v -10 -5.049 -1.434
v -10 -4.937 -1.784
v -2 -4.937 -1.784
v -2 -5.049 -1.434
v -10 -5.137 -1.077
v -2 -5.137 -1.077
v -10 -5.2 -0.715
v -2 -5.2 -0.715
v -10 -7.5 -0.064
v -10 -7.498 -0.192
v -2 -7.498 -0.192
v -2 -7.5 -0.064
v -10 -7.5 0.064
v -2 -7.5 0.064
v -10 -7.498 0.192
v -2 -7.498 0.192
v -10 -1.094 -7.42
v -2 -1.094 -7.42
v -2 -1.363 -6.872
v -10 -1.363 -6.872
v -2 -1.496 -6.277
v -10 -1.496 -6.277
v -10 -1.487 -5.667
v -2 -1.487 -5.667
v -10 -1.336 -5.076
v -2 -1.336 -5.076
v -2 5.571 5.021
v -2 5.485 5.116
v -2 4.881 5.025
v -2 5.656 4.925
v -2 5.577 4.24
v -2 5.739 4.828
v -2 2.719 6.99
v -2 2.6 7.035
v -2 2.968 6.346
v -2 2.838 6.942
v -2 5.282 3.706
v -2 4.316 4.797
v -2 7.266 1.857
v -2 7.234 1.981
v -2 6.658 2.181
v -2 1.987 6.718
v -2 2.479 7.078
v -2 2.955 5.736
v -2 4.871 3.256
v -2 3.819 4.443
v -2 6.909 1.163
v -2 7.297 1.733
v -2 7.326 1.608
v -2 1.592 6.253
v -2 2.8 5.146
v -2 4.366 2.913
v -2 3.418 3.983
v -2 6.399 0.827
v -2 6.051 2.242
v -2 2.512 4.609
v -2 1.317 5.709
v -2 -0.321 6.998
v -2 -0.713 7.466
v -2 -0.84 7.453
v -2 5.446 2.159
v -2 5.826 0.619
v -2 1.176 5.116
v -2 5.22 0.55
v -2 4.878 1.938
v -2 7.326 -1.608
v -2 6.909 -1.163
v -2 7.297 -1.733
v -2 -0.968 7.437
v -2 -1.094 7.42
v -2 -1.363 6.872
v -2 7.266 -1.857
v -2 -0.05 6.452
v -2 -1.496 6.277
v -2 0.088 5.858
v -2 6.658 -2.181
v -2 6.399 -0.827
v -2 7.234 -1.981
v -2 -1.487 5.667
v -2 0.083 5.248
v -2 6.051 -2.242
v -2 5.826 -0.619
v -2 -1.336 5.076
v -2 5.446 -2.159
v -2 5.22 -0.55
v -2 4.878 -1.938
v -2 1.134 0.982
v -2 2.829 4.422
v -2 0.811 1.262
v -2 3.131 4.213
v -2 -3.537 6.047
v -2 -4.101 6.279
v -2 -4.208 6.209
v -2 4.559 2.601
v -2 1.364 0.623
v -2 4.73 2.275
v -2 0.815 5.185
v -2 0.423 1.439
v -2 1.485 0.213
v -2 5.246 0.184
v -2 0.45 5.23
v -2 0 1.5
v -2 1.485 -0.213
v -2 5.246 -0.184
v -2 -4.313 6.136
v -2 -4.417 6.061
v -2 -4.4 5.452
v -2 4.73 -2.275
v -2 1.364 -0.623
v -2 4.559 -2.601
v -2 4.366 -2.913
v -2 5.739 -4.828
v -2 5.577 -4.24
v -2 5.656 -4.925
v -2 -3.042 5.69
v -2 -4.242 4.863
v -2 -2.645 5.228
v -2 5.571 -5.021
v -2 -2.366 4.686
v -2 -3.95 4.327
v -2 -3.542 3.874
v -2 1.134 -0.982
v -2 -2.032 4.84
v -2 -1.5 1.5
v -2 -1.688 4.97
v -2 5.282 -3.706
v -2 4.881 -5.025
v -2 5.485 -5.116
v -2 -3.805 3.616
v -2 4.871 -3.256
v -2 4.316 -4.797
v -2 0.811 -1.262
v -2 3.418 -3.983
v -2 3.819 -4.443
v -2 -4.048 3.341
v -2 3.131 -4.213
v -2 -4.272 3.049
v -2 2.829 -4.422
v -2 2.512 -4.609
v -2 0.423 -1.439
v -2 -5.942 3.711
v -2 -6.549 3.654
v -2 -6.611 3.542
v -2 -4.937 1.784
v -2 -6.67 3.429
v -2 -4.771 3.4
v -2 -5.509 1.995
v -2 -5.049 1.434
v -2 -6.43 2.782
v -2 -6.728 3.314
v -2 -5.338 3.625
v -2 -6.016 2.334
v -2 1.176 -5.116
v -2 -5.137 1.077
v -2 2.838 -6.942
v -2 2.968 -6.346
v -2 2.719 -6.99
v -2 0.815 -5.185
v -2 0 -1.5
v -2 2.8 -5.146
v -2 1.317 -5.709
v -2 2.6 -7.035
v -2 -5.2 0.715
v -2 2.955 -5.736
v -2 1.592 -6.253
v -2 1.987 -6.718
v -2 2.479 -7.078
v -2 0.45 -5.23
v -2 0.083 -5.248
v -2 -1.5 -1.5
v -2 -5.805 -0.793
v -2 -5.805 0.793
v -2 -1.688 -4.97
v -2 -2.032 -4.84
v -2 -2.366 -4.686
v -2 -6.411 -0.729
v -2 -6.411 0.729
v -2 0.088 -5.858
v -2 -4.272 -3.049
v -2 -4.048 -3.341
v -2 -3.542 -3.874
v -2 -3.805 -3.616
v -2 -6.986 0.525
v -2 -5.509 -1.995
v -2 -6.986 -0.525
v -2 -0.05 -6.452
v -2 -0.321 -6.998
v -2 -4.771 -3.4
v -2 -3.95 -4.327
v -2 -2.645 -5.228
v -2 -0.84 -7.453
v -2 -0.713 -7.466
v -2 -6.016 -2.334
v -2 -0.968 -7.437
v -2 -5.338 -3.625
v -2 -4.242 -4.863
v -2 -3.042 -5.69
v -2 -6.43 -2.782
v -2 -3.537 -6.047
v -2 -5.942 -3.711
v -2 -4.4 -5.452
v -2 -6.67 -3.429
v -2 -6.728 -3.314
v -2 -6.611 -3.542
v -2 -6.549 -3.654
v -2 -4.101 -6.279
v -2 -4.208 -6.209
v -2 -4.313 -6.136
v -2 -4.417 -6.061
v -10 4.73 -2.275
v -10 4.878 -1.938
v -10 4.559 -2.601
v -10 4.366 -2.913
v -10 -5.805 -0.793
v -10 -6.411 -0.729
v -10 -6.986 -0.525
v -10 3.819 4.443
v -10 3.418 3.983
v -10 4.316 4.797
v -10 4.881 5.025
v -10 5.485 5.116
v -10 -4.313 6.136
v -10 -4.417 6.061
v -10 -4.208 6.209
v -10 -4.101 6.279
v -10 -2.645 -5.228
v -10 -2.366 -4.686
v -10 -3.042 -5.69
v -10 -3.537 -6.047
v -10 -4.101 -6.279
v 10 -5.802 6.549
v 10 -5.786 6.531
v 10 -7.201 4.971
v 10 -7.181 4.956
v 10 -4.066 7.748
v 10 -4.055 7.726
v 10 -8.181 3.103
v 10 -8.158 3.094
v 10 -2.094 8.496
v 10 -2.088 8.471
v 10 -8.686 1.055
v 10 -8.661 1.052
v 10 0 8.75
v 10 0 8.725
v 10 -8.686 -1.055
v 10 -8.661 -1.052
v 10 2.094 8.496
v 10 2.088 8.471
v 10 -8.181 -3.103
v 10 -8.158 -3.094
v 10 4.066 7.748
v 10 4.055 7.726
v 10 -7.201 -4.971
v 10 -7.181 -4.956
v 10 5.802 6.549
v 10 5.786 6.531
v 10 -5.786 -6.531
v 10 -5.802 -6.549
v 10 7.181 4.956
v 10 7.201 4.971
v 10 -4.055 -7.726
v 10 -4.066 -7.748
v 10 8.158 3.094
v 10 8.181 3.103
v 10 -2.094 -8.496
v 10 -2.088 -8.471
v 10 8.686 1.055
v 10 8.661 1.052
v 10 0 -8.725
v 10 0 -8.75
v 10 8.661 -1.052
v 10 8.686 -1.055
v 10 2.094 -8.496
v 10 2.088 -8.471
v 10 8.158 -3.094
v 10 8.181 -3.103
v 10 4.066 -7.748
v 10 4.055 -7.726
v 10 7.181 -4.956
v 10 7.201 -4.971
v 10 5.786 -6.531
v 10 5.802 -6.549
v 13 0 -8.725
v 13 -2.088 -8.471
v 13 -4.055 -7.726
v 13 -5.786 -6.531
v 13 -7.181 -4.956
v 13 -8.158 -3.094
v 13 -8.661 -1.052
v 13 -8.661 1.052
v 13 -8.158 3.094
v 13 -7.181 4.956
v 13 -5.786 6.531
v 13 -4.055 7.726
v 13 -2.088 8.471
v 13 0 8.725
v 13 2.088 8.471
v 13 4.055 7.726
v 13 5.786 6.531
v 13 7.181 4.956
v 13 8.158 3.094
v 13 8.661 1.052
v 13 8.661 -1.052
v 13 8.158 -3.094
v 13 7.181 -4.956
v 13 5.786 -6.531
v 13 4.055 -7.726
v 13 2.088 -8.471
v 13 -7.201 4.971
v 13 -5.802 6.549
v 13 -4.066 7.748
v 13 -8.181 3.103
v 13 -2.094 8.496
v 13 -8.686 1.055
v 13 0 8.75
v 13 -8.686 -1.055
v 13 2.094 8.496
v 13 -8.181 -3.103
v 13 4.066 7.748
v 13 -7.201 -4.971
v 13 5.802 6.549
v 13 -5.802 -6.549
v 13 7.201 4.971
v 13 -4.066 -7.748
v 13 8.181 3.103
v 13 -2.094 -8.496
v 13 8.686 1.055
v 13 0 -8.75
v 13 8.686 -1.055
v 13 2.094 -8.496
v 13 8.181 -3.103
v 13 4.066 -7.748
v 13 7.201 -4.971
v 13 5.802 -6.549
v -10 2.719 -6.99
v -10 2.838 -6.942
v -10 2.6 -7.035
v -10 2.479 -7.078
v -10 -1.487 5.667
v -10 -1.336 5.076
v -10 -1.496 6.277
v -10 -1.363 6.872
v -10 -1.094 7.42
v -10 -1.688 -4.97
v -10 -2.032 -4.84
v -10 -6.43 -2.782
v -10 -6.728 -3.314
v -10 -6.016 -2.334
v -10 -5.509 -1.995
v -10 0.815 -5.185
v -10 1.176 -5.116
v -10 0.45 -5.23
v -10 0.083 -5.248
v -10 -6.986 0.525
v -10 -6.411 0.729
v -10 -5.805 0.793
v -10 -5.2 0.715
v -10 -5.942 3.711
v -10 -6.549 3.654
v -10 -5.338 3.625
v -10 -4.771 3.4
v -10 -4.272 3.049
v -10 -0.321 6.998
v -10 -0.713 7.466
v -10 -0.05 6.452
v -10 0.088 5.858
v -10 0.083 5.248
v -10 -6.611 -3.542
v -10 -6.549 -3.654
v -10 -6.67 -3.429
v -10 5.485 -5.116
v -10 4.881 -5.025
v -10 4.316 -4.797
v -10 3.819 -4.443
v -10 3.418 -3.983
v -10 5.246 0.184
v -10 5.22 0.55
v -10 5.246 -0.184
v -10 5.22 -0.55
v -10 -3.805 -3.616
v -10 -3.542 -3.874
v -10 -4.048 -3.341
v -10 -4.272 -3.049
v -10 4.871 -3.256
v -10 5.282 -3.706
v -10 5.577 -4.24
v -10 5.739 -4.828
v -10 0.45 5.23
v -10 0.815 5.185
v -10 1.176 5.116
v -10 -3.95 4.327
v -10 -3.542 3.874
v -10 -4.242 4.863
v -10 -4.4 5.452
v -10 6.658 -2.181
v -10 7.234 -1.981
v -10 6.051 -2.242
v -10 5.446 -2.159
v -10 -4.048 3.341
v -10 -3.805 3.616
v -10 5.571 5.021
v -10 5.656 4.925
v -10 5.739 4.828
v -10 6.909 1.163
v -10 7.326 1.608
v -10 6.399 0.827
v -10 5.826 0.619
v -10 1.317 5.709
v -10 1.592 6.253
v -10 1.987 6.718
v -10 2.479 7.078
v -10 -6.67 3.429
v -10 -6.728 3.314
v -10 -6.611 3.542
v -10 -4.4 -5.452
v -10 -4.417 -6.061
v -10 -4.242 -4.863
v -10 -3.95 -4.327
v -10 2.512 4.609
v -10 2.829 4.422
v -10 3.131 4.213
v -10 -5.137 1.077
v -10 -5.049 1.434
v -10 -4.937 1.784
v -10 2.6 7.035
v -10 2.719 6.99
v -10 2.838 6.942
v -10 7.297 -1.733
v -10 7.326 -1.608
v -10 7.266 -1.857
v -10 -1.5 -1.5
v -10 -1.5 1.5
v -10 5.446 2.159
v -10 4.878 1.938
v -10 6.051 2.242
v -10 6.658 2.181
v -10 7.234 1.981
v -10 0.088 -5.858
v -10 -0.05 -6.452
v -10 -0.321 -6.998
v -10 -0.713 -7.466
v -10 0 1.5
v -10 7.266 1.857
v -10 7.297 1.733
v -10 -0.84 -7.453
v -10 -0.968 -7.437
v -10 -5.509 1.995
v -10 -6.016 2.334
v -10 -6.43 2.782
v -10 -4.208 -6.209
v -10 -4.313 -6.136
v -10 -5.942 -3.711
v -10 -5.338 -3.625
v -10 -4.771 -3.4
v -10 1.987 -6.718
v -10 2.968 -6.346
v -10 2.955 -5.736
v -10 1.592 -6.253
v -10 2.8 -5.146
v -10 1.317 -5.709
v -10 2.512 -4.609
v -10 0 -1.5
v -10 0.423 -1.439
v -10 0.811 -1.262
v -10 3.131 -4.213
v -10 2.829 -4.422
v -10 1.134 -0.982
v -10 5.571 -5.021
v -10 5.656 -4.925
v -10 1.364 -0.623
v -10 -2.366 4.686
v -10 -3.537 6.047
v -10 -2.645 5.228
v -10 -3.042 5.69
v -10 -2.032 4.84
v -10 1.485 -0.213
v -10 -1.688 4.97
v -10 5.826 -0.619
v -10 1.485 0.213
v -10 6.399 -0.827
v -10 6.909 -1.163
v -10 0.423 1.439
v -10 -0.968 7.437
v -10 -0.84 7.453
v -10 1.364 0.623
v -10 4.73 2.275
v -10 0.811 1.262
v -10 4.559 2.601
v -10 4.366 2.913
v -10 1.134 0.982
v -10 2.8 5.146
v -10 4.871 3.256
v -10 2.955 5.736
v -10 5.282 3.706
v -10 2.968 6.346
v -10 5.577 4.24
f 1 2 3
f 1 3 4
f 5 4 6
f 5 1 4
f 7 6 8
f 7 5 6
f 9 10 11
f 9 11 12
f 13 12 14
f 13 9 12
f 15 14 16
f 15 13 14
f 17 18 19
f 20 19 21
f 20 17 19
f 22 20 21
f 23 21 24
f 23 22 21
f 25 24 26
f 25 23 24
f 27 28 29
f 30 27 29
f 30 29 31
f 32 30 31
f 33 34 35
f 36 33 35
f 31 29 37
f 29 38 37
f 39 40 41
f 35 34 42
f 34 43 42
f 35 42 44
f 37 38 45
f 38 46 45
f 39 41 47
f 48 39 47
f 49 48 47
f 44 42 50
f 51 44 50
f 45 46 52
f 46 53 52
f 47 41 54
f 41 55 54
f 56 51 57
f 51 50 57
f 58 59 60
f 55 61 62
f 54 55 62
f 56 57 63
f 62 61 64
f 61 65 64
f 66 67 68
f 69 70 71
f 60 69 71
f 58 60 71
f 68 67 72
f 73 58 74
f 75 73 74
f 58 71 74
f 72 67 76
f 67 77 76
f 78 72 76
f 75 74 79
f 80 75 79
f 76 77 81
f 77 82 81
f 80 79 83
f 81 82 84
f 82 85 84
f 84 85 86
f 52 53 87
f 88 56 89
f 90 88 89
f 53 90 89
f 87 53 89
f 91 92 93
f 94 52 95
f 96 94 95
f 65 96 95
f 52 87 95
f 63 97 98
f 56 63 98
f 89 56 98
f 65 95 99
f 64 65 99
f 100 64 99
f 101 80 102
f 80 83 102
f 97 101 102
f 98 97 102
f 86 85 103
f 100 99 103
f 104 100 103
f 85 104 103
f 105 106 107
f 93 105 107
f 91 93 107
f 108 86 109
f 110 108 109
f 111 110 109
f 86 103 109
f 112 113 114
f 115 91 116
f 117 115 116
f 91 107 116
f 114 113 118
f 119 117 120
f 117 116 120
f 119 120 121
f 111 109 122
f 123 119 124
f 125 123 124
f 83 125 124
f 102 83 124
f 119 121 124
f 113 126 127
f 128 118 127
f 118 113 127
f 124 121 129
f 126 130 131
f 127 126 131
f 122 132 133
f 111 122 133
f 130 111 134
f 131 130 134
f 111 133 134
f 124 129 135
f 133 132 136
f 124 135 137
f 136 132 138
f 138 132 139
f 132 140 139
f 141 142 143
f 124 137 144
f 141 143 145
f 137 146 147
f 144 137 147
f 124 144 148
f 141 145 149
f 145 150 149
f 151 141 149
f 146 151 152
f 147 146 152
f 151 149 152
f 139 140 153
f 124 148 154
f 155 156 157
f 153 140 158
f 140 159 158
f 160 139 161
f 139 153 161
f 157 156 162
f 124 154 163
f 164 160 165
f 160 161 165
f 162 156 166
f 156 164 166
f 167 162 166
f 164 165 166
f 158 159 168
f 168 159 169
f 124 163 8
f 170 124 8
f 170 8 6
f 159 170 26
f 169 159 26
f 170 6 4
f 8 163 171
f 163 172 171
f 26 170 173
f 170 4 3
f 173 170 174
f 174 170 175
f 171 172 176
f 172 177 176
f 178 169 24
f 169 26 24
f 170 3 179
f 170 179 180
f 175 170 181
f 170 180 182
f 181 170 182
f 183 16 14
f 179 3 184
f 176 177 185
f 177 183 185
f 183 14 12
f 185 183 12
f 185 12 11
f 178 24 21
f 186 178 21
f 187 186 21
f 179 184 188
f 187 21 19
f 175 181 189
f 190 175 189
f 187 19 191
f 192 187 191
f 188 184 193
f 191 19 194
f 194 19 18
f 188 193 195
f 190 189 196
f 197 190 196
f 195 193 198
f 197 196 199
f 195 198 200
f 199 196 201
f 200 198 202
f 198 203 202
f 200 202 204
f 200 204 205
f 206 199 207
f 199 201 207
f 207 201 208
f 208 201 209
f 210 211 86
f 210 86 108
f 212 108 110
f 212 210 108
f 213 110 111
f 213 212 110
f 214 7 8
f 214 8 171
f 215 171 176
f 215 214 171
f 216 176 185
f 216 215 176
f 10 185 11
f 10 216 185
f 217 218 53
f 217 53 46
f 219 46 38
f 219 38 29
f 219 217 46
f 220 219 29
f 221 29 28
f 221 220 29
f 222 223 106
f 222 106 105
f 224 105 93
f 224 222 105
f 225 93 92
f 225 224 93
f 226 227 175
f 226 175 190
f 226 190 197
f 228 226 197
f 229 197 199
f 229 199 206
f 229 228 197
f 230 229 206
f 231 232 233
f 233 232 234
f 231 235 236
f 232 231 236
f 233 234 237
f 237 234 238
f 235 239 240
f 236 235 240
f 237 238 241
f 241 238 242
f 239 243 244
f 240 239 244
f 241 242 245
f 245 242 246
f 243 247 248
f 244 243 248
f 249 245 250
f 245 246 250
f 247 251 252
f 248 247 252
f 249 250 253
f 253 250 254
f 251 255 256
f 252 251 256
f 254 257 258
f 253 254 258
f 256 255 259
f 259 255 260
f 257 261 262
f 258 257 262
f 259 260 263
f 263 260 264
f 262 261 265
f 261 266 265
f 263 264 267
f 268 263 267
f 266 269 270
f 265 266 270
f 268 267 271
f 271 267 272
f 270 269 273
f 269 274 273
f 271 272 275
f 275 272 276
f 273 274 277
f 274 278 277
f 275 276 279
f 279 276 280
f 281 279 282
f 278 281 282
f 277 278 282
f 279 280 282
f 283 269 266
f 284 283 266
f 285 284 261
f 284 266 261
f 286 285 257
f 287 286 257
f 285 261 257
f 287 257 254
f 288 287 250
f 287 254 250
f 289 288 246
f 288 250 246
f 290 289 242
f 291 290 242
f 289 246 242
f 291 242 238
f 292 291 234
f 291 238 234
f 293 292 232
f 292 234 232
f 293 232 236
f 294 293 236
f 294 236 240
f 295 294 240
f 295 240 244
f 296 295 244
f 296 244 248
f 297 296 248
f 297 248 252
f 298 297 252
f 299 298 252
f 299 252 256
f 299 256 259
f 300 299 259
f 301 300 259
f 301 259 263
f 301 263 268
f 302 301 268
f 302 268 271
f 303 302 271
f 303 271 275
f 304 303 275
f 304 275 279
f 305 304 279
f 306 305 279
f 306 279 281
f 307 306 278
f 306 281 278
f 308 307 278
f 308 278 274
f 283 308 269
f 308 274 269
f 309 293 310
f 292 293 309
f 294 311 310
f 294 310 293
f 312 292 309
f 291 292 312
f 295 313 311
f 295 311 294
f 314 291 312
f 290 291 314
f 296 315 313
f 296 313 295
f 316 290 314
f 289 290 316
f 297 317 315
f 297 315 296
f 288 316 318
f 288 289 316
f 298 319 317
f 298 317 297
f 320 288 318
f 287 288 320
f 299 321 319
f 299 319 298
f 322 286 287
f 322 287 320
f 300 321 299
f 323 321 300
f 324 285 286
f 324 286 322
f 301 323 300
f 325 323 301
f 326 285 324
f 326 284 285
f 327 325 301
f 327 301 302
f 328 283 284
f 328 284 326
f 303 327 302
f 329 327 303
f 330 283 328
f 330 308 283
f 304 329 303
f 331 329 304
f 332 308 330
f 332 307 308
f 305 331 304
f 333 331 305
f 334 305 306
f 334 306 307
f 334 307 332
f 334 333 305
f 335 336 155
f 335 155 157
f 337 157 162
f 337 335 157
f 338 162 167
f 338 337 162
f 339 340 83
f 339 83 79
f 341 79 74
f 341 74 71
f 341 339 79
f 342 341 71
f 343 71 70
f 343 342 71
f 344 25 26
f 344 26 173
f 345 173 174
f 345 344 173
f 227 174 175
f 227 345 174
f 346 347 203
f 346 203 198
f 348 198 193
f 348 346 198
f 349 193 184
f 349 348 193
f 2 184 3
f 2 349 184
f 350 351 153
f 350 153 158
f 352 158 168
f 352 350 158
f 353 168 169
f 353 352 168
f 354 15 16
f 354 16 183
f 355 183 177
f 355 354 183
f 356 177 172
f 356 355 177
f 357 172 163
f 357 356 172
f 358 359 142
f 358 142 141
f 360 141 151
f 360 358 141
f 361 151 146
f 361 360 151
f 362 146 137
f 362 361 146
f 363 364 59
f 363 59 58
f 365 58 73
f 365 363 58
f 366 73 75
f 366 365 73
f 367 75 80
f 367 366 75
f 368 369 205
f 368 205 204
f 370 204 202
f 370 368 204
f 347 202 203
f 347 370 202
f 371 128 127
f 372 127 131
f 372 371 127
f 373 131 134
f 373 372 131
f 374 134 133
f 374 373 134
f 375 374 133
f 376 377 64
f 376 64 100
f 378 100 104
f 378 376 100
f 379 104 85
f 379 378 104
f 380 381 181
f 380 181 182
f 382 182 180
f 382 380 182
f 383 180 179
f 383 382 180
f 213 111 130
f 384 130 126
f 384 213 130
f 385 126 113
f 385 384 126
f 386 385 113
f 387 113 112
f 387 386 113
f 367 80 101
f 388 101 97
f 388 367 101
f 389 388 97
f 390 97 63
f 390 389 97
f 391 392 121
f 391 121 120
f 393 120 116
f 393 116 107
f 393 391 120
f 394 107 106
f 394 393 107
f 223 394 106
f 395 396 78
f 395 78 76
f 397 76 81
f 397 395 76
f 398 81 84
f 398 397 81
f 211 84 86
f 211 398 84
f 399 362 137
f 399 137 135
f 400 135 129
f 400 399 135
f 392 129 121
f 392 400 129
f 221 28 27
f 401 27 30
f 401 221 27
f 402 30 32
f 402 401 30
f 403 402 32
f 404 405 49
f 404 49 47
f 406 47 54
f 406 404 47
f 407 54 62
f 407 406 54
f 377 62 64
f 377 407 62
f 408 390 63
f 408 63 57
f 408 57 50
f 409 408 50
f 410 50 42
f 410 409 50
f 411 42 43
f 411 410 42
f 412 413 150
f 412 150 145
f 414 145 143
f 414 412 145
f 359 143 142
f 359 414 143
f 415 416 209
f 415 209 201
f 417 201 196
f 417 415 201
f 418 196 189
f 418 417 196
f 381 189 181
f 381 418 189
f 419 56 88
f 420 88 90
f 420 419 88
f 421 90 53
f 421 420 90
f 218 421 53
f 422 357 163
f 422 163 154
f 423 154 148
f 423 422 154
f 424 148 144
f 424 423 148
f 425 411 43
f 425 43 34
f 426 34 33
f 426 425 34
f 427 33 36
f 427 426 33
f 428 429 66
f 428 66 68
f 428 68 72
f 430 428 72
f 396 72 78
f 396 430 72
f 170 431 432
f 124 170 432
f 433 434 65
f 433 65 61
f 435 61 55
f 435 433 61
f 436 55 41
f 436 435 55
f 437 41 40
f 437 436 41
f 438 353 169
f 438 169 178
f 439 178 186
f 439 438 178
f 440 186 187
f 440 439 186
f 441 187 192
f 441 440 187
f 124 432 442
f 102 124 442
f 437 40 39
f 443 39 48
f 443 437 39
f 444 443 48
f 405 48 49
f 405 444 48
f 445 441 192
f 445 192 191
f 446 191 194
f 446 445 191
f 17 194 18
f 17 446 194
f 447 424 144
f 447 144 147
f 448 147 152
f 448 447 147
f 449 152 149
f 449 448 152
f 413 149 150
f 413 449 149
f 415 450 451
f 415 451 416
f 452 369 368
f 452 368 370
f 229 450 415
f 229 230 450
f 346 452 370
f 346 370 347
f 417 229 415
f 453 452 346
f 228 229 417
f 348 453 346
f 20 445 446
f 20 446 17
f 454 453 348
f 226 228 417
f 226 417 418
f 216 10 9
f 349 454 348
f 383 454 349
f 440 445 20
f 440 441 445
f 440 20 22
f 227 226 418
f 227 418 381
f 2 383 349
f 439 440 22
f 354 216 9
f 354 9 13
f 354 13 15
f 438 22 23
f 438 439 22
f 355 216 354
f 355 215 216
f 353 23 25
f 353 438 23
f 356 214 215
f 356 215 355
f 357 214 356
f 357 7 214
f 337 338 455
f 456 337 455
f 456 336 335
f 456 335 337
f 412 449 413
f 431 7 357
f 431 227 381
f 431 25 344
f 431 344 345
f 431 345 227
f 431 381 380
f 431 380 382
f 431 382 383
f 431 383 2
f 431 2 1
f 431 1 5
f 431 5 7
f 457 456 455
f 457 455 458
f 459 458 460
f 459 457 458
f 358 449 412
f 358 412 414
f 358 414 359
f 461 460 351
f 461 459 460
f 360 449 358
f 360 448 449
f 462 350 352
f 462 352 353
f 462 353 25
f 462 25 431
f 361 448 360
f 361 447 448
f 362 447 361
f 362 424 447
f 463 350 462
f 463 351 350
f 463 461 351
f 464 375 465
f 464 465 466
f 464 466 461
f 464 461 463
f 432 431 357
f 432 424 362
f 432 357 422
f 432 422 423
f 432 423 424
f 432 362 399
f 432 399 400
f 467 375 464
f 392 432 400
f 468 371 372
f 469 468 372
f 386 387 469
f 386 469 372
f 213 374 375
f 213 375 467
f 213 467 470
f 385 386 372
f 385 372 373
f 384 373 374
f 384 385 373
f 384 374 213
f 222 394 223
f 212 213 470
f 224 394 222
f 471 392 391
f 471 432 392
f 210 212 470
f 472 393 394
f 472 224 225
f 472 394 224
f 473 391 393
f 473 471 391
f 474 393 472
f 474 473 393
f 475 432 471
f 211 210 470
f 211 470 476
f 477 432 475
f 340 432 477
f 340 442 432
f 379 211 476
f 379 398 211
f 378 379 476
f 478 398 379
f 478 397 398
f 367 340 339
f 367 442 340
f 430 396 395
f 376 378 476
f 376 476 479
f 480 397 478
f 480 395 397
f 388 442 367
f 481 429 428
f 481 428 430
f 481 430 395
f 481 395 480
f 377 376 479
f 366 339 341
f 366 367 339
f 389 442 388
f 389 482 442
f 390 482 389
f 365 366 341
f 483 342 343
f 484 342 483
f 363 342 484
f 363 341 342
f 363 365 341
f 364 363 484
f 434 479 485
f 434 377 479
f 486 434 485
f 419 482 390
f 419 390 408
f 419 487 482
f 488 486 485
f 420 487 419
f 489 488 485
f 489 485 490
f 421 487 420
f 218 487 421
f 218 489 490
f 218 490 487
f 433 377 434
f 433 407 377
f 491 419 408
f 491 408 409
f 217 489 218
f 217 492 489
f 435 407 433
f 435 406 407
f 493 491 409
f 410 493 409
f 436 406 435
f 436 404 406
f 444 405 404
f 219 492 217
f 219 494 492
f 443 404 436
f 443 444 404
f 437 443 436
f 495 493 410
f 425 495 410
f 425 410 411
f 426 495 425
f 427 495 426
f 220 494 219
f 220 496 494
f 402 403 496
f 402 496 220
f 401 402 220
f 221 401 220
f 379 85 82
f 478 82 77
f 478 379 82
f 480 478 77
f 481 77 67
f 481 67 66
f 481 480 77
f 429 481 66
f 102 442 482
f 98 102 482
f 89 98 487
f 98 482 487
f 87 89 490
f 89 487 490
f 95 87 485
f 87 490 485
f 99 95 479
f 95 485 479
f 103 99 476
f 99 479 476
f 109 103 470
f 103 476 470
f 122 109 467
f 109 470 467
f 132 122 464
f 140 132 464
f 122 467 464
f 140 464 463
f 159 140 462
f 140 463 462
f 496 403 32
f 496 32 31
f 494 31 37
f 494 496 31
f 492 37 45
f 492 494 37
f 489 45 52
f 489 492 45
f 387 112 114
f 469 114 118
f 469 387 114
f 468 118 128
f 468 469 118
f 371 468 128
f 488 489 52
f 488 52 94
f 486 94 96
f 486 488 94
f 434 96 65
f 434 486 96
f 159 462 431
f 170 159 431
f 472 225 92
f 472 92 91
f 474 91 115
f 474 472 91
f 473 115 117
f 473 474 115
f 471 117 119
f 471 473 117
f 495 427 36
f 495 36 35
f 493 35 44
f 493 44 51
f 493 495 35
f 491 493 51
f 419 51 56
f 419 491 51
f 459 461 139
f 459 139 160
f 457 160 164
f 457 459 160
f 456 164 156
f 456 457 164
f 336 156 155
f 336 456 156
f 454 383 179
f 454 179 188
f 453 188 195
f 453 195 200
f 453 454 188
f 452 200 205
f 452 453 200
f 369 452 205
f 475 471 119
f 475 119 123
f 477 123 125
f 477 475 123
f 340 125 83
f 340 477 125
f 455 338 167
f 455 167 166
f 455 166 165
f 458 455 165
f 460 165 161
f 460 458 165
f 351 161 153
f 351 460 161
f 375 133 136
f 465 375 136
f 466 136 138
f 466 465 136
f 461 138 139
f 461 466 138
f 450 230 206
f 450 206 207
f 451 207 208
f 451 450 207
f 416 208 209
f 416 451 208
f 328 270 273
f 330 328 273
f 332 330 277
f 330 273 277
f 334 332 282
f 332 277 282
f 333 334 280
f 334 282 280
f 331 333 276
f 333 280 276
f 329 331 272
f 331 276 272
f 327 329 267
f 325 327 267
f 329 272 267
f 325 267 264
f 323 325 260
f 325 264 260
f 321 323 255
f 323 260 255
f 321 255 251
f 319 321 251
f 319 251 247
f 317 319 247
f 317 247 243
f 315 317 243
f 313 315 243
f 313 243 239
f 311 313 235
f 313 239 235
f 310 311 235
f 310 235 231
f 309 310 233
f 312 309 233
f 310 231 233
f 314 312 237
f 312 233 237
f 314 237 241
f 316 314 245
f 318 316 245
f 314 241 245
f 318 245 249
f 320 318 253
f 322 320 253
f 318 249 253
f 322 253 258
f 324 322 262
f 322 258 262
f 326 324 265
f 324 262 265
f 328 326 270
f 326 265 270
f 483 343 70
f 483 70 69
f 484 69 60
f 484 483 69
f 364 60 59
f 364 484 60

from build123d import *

# Parameters (mm, degrees)
CUT_EXTRUDE1_START         = -10
CUT_EXTRUDE1_DEPTH         = 10
CUT_EXTRUDE2_DEPTH         = 15.577379737
CUT_EXTRUDE3_DEPTH         = 15.577379737
CUT_EXTRUDE4_DEPTH         = 15.577379737
CUT_EXTRUDE5_DEPTH         = 15.577379737
CUT_EXTRUDE6_DEPTH         = 15.577379737
CUT_EXTRUDE7_DEPTH         = 15.577379737
CUT_EXTRUDE8_DEPTH         = 15.577379737
CUT_EXTRUDE9_DEPTH         = 15.577379737
CUT_EXTRUDE10_DEPTH        = 15.559932415
CUT_EXTRUDE11_DEPTH        = 15.559932415
CUT_EXTRUDE12_DEPTH        = 15.559932415
CUT_EXTRUDE13_DEPTH        = 15.559932415
F_0_8_0_8_DIAMETER_HOLE1_D = 0.8
SKETCH20_R                 = 8.75
BOSS_EXTRUDE2_DEPTH        = 3
BOSS_EXTRUDE3_START        = 10
BOSS_EXTRUDE3_DEPTH        = 10
CUT_EXTRUDE14_REACH        = 21.445
SKETCH23_R                 = 8.725
CUT_EXTRUDE15_DEPTH        = 8


with BuildPart() as part:
    # Cut-Extrude1: read off the stored shape, not the designer's step
    # Cut-Extrude1 outline → Cut-Extrude1 (new body)
    with BuildSketch(Plane(origin=(10, 0, 0), x_dir=(0, 0, -1), z_dir=(1, 0, 0)).offset(CUT_EXTRUDE1_START)):
        with BuildLine():
            ThreePointArc((5.115599083, 5.484582575), (-6.172378994, -4.2604856), (6.942190227, 2.838308449))
            ThreePointArc((6.942190227, 2.838308449), (5.736412412, 2.954786958), (4.608733854, 2.512284471))
            ThreePointArc((4.608733854, 2.512284471), (4.319842312, 2.981771856), (3.983306334, 3.41837266))
            ThreePointArc((3.983306334, 3.41837266), (4.796933675, 4.315856884), (5.115599083, 5.484582575))
        make_face()
    extrude(amount=CUT_EXTRUDE1_DEPTH)

    # Sketch3 → Cut-Extrude2 (cut, through all)
    with BuildSketch(Plane(origin=(10, 0, 0), x_dir=(0, 0, -1), z_dir=(1, 0, 0))):
        with BuildLine():
            ThreePointArc((7.466031873, -0.712999344), (7.445316556, 0.904025102), (7.078450644, 2.479019256))
            ThreePointArc((7.078450644, 2.479019256), (6.253152529, 1.592255251), (5.115639582, 1.175683915))
            ThreePointArc((5.115639582, 1.175683915), (5.21072888, 0.632697035), (5.24834797, 0.082732007))
            ThreePointArc((5.24834797, 0.082732007), (6.452498904, -0.049509856), (7.466031873, -0.712999344))
        make_face()
    extrude(amount=-CUT_EXTRUDE2_DEPTH, mode=Mode.SUBTRACT)

    # Sketch4 → Cut-Extrude3 (cut, through all)
    with BuildSketch(Plane(origin=(10, 0, 0), x_dir=(0, 0, -1), z_dir=(1, 0, 0))):
        with BuildLine():
            ThreePointArc((6.279495593, -4.10096758), (7.01262182, -2.659536653), (7.419714468, -1.094457498))
            ThreePointArc((7.419714468, -1.094457498), (6.276849497, -1.496112872), (5.076041451, -1.336339847))
            ThreePointArc((5.076041451, -1.336339847), (4.907900258, -1.861321052), (4.685628816, -2.365773362))
            ThreePointArc((4.685628816, -2.365773362), (5.690395658, -3.042464558), (6.279495593, -4.10096758))
        make_face()
    extrude(amount=-CUT_EXTRUDE3_DEPTH, mode=Mode.SUBTRACT)

    # Sketch5 → Cut-Extrude4 (cut, through all)
    with BuildSketch(Plane(origin=(10, 0, 0), x_dir=(0, 0, -1), z_dir=(1, 0, 0))):
        with BuildLine():
            ThreePointArc((3.654402549, -6.549453566), (4.973419937, -5.613830611), (6.061211124, -4.41720723))
            ThreePointArc((6.061211124, -4.41720723), (4.862595889, -4.241739566), (3.873583397, -3.542224254))
            ThreePointArc((3.873583397, -3.542224254), (3.480730833, -3.928932917), (3.049488568, -4.272308565))
            ThreePointArc((3.049488568, -4.272308565), (3.624691343, -5.338427296), (3.654402549, -6.549453566))
        make_face()
    extrude(amount=-CUT_EXTRUDE4_DEPTH, mode=Mode.SUBTRACT)

    # Sketch6 → Cut-Extrude5 (cut, through all)
    with BuildSketch(Plane(origin=(10, 0, 0), x_dir=(0, 0, -1), z_dir=(1, 0, 0))):
        with BuildLine():
            ThreePointArc((0.192129921, -7.497538669), (1.794867482, -7.282063631), (3.314157357, -6.728028018))
            ThreePointArc((3.314157357, -6.728028018), (2.334380164, -6.015634844), (1.783734068, -4.936627773))
            ThreePointArc((1.783734068, -4.936627773), (1.256167922, -5.0964736), (0.714747239, -5.200109363))
            ThreePointArc((0.714747239, -5.200109363), (0.728613924, -6.411420676), (0.192129921, -7.497538669))
        make_face()
    extrude(amount=-CUT_EXTRUDE5_DEPTH, mode=Mode.SUBTRACT)

    # Sketch7 → Cut-Extrude6 (cut, through all)
    with BuildSketch(Plane(origin=(10, 0, 0), x_dir=(0, 0, -1), z_dir=(1, 0, 0))):
        with BuildLine():
            ThreePointArc((-3.314157357, -6.728028018), (-1.794867482, -7.282063631), (-0.192129921, -7.497538669))
            ThreePointArc((-0.192129921, -7.497538669), (-0.728613924, -6.411420676), (-0.714747239, -5.200109363))
            ThreePointArc((-0.714747239, -5.200109363), (-1.256167922, -5.0964736), (-1.783734068, -4.936627773))
            ThreePointArc((-1.783734068, -4.936627773), (-2.334380164, -6.015634844), (-3.314157357, -6.728028018))
        make_face()
    extrude(amount=-CUT_EXTRUDE6_DEPTH, mode=Mode.SUBTRACT)

    # Sketch8 → Cut-Extrude7 (cut, through all)
    with BuildSketch(Plane(origin=(10, 0, 0), x_dir=(0, 0, -1), z_dir=(1, 0, 0))):
        with BuildLine():
            ThreePointArc((-6.061211124, -4.41720723), (-4.973419937, -5.613830611), (-3.654402549, -6.549453566))
            ThreePointArc((-3.654402549, -6.549453566), (-3.624691343, -5.338427296), (-3.049488568, -4.272308565))
            ThreePointArc((-3.049488568, -4.272308565), (-3.480730833, -3.928932917), (-3.873583397, -3.542224254))
            ThreePointArc((-3.873583397, -3.542224254), (-4.862595889, -4.241739566), (-6.061211124, -4.41720723))
        make_face()
    extrude(amount=-CUT_EXTRUDE7_DEPTH, mode=Mode.SUBTRACT)

    # Sketch9 → Cut-Extrude8 (cut, through all)
    with BuildSketch(Plane(origin=(10, 0, 0), x_dir=(0, 0, -1), z_dir=(1, 0, 0))):
        with BuildLine():
            ThreePointArc((-7.419714468, -1.094457498), (-7.01262182, -2.659536653), (-6.279495593, -4.10096758))
            ThreePointArc((-6.279495593, -4.10096758), (-5.690395658, -3.042464558), (-4.685628816, -2.365773362))
            ThreePointArc((-4.685628816, -2.365773362), (-4.907900258, -1.861321052), (-5.076041451, -1.336339847))
            ThreePointArc((-5.076041451, -1.336339847), (-6.276849497, -1.496112872), (-7.419714468, -1.094457498))
        make_face()
    extrude(amount=-CUT_EXTRUDE8_DEPTH, mode=Mode.SUBTRACT)

    # Sketch10 → Cut-Extrude9 (cut, through all)
    with BuildSketch(Plane(origin=(10, 0, 0), x_dir=(0, 0, -1), z_dir=(1, 0, 0))):
        with BuildLine():
            ThreePointArc((-7.078450644, 2.479019256), (-7.445316556, 0.904025102), (-7.466031873, -0.712999344))
            ThreePointArc((-7.466031873, -0.712999344), (-6.452498904, -0.049509856), (-5.24834797, 0.082732007))
            ThreePointArc((-5.24834797, 0.082732007), (-5.21072888, 0.632697035), (-5.115639582, 1.175683915))
            ThreePointArc((-5.115639582, 1.175683915), (-6.253152529, 1.592255251), (-7.078450644, 2.479019256))
        make_face()
    extrude(amount=-CUT_EXTRUDE9_DEPTH, mode=Mode.SUBTRACT)

    # Sketch11 → Cut-Extrude10 (cut, through all)
    with BuildSketch(Plane(origin=(10, 0, 0), x_dir=(0, 0, -1), z_dir=(1, 0, 0))):
        with BuildLine():
            ThreePointArc((-5.115599083, 5.484582575), (-6.172378994, 4.2604856), (-6.942190227, 2.838308449))
            ThreePointArc((-6.942190227, 2.838308449), (-5.736412412, 2.954786958), (-4.608733854, 2.512284471))
            ThreePointArc((-4.608733854, 2.512284471), (-4.319842312, 2.981771856), (-3.983306334, 3.41837266))
            ThreePointArc((-3.983306334, 3.41837266), (-4.796933675, 4.315856884), (-5.115599083, 5.484582575))
        make_face()
    extrude(amount=-CUT_EXTRUDE10_DEPTH, mode=Mode.SUBTRACT)

    # Sketch12 → Cut-Extrude11 (cut, through all)
    with BuildSketch(Plane(origin=(10, 0, 0), x_dir=(0, 0, -1), z_dir=(1, 0, 0))):
        with BuildLine():
            ThreePointArc((-1.980825421, 7.233694122), (-3.48542379, 6.640920192), (-4.827976462, 5.739393982))
            ThreePointArc((-4.827976462, 5.739393982), (-3.706182968, 5.282177689), (-2.913314353, 4.366302839))
            ThreePointArc((-2.913314353, 4.366302839), (-2.43933193, 4.647758679), (-1.93844561, 4.877953425))
            ThreePointArc((-1.93844561, 4.877953425), (-2.241795126, 6.050747718), (-1.980825421, 7.233694122))
        make_face()
    extrude(amount=-CUT_EXTRUDE11_DEPTH, mode=Mode.SUBTRACT)

    # Sketch13 → Cut-Extrude12 (cut, through all)
    with BuildSketch(Plane(origin=(10, 0, 0), x_dir=(0, 0, -1), z_dir=(1, 0, 0))):
        with BuildLine():
            ThreePointArc((1.607731473, 7.325653521), (0, 7.5), (-1.607731473, 7.325653521))
            ThreePointArc((-1.607731473, 7.325653521), (-0.82691167, 6.399485168), (-0.550489643, 5.220053846))
            ThreePointArc((-0.550489643, 5.220053846), (0, 5.249), (0.550489643, 5.220053846))
            ThreePointArc((0.550489643, 5.220053846), (0.82691167, 6.399485168), (1.607731473, 7.325653521))
        make_face()
    extrude(amount=-CUT_EXTRUDE12_DEPTH, mode=Mode.SUBTRACT)

    # Sketch14 → Cut-Extrude13 (cut, through all)
    with BuildSketch(Plane(origin=(10, 0, 0), x_dir=(0, 0, -1), z_dir=(1, 0, 0))):
        with BuildLine():
            ThreePointArc((4.827976462, 5.739393982), (3.48542379, 6.640920192), (1.980825421, 7.233694122))
            ThreePointArc((1.980825421, 7.233694122), (2.241795126, 6.050747718), (1.93844561, 4.877953425))
            ThreePointArc((1.93844561, 4.877953425), (2.43933193, 4.647758679), (2.913314353, 4.366302839))
            ThreePointArc((2.913314353, 4.366302839), (3.706182968, 5.282177689), (4.827976462, 5.739393982))
        make_face()
    extrude(amount=-CUT_EXTRUDE13_DEPTH, mode=Mode.SUBTRACT)

    # Ø0.8 (0.8) Diameter Hole1 (through all)
    with Locations(Plane(origin=(10, 0, 0), x_dir=(0, 0, -1), z_dir=(1, 0, 0))):
        with Locations((0, 0)):
            Hole(F_0_8_0_8_DIAMETER_HOLE1_D / 2)

    # Sketch20 → Boss-Extrude2 (add)
    with BuildSketch(Plane(origin=(10, 0, 0), x_dir=(0, 0, -1), z_dir=(1, 0, 0))):
        Circle(SKETCH20_R)
    extrude(amount=BOSS_EXTRUDE2_DEPTH)

    # Sketch22 → Boss-Extrude3 (add)
    with BuildSketch(Plane.ZY.offset(BOSS_EXTRUDE3_START)):
        with BuildLine():
            ThreePointArc((-1.93844561, 4.877953425), (-2.43933193, 4.647758679), (-2.913314353, 4.366302839))
            ThreePointArc((-2.913314353, 4.366302839), (-3.706182968, 5.282177689), (-4.827976462, 5.739393982))
            ThreePointArc((-4.827976462, 5.739393982), (-4.973419937, 5.613830611), (-5.115599083, 5.484582575))
            ThreePointArc((-5.115599083, 5.484582575), (-4.796933675, 4.315856884), (-3.983306334, 3.41837266))
            ThreePointArc((-3.983306334, 3.41837266), (-4.319842312, 2.981771856), (-4.608733854, 2.512284471))
            ThreePointArc((-4.608733854, 2.512284471), (-5.736412412, 2.954786958), (-6.942190227, 2.838308449))
            ThreePointArc((-6.942190227, 2.838308449), (-7.01262182, 2.659536653), (-7.078450644, 2.479019256))
            ThreePointArc((-7.078450644, 2.479019256), (-6.253152529, 1.592255251), (-5.115639582, 1.175683915))
            ThreePointArc((-5.115639582, 1.175683915), (-5.21072888, 0.632697035), (-5.24834797, 0.082732007))
            ThreePointArc((-5.24834797, 0.082732007), (-6.452498904, -0.049509856), (-7.466031873, -0.712999344))
            ThreePointArc((-7.466031873, -0.712999344), (-7.445316556, -0.904025102), (-7.419714468, -1.094457498))
            ThreePointArc((-7.419714468, -1.094457498), (-6.276849497, -1.496112872), (-5.076041451, -1.336339847))
            ThreePointArc((-5.076041451, -1.336339847), (-4.907900258, -1.861321052), (-4.685628816, -2.365773362))
            ThreePointArc((-4.685628816, -2.365773362), (-5.690395658, -3.042464558), (-6.279495593, -4.10096758))
            ThreePointArc((-6.279495593, -4.10096758), (-6.172378994, -4.2604856), (-6.061211124, -4.41720723))
            ThreePointArc((-6.061211124, -4.41720723), (-4.862595889, -4.241739566), (-3.873583397, -3.542224254))
            ThreePointArc((-3.873583397, -3.542224254), (-3.480730833, -3.928932917), (-3.049488568, -4.272308565))
            ThreePointArc((-3.049488568, -4.272308565), (-3.624691343, -5.338427296), (-3.654402549, -6.549453566))
            ThreePointArc((-3.654402549, -6.549453566), (-3.48542379, -6.640920192), (-3.314157357, -6.728028018))
            ThreePointArc((-3.314157357, -6.728028018), (-2.334380164, -6.015634844), (-1.783734068, -4.936627773))
            ThreePointArc((-1.783734068, -4.936627773), (-1.256167922, -5.0964736), (-0.714747239, -5.200109363))
            ThreePointArc((-0.714747239, -5.200109363), (-0.728613924, -6.411420676), (-0.192129921, -7.497538669))
            ThreePointArc((-0.192129921, -7.497538669), (0, -7.5), (0.192129921, -7.497538669))
            ThreePointArc((0.192129921, -7.497538669), (0.728613924, -6.411420676), (0.714747239, -5.200109363))
            ThreePointArc((0.714747239, -5.200109363), (1.256167922, -5.0964736), (1.783734068, -4.936627773))
            ThreePointArc((1.783734068, -4.936627773), (2.334380164, -6.015634844), (3.314157357, -6.728028018))
            ThreePointArc((3.314157357, -6.728028018), (3.48542379, -6.640920192), (3.654402549, -6.549453566))
            ThreePointArc((3.654402549, -6.549453566), (3.624691343, -5.338427296), (3.049488568, -4.272308565))
            ThreePointArc((3.049488568, -4.272308565), (3.480730833, -3.928932917), (3.873583397, -3.542224254))
            ThreePointArc((3.873583397, -3.542224254), (4.862595889, -4.241739566), (6.061211124, -4.41720723))
            ThreePointArc((6.061211124, -4.41720723), (6.172378994, -4.2604856), (6.279495593, -4.10096758))
            ThreePointArc((6.279495593, -4.10096758), (5.690395658, -3.042464558), (4.685628816, -2.365773362))
            ThreePointArc((4.685628816, -2.365773362), (4.907900258, -1.861321052), (5.076041451, -1.336339847))
            ThreePointArc((5.076041451, -1.336339847), (6.276849497, -1.496112872), (7.419714468, -1.094457498))
            ThreePointArc((7.419714468, -1.094457498), (7.445316556, -0.904025102), (7.466031873, -0.712999344))
            ThreePointArc((7.466031873, -0.712999344), (6.452498904, -0.049509856), (5.24834797, 0.082732007))
            ThreePointArc((5.24834797, 0.082732007), (5.21072888, 0.632697035), (5.115639582, 1.175683915))
            ThreePointArc((5.115639582, 1.175683915), (6.253152529, 1.592255251), (7.078450644, 2.479019256))
            ThreePointArc((7.078450644, 2.479019256), (7.01262182, 2.659536653), (6.942190227, 2.838308449))
            ThreePointArc((6.942190227, 2.838308449), (5.736412412, 2.954786958), (4.608733854, 2.512284471))
            ThreePointArc((4.608733854, 2.512284471), (4.319842312, 2.981771856), (3.983306334, 3.41837266))
            ThreePointArc((3.983306334, 3.41837266), (4.796933675, 4.315856884), (5.115599083, 5.484582575))
            ThreePointArc((5.115599083, 5.484582575), (4.973419937, 5.613830611), (4.827976462, 5.739393982))
            ThreePointArc((4.827976462, 5.739393982), (3.706182968, 5.282177689), (2.913314353, 4.366302839))
            ThreePointArc((2.913314353, 4.366302839), (2.43933193, 4.647758679), (1.93844561, 4.877953425))
            ThreePointArc((1.93844561, 4.877953425), (2.241795126, 6.050747718), (1.980825421, 7.233694122))
            ThreePointArc((1.980825421, 7.233694122), (1.794867482, 7.282063631), (1.607731473, 7.325653521))
            ThreePointArc((1.607731473, 7.325653521), (0.82691167, 6.399485168), (0.550489643, 5.220053846))
            ThreePointArc((0.550489643, 5.220053846), (0, 5.249), (-0.550489643, 5.220053846))
            ThreePointArc((-0.550489643, 5.220053846), (-0.82691167, 6.399485168), (-1.607731473, 7.325653521))
            ThreePointArc((-1.607731473, 7.325653521), (-1.794867482, 7.282063631), (-1.980825421, 7.233694122))
            ThreePointArc((-1.980825421, 7.233694122), (-2.241795126, 6.050747718), (-1.93844561, 4.877953425))
        make_face()
    extrude(amount=-BOSS_EXTRUDE3_DEPTH)

    # Sketch23 → Cut-Extrude14 (cut, up to next)
    with BuildSketch(Plane.ZY.offset(2), mode=Mode.PRIVATE) as cut_extrude14_sk1:
        with Locations(Location((0, 0, 0), (0, 0, 180))):
            Circle(SKETCH23_R)
    cut_extrude14_tool1 = extrude(cut_extrude14_sk1.sketch, amount=-CUT_EXTRUDE14_REACH, mode=Mode.PRIVATE) & part.part
    add(cut_extrude14_tool1.solids().sort_by_distance((-2, 0, 0))[0], mode=Mode.SUBTRACT)


with BuildPart() as cut_extrude14_piece_1:
    # of the separate pieces the step leaves, piece 1, a body of its own (cut_extrude14_pieces)
    add(part.part.solids().sort_by_distance((-2, 5.739393982, -4.827976462))[0])

    # Sketch24 → Cut-Extrude15 (cut)
    with BuildSketch(Plane.ZY.offset(10)):
        with BuildLine():
            Line((-1.5, 0), (-1.5, -1.5))
            Line((-1.5, -1.5), (1.5, -1.5))
            Line((1.5, -1.5), (1.5, 0))
            ThreePointArc((1.5, 0), (0, 1.5), (-1.5, 0))
        make_face()
    extrude(amount=-CUT_EXTRUDE15_DEPTH, mode=Mode.SUBTRACT)


with BuildPart() as cut_extrude14_piece_2:
    # of the separate pieces the step leaves, piece 2, a body of its own (cut_extrude14_pieces)
    add(part.part.solids().sort_by_distance((10, 0, -8.75))[0])


solid = Compound([cut_extrude14_piece_1.part, cut_extrude14_piece_2.part])
